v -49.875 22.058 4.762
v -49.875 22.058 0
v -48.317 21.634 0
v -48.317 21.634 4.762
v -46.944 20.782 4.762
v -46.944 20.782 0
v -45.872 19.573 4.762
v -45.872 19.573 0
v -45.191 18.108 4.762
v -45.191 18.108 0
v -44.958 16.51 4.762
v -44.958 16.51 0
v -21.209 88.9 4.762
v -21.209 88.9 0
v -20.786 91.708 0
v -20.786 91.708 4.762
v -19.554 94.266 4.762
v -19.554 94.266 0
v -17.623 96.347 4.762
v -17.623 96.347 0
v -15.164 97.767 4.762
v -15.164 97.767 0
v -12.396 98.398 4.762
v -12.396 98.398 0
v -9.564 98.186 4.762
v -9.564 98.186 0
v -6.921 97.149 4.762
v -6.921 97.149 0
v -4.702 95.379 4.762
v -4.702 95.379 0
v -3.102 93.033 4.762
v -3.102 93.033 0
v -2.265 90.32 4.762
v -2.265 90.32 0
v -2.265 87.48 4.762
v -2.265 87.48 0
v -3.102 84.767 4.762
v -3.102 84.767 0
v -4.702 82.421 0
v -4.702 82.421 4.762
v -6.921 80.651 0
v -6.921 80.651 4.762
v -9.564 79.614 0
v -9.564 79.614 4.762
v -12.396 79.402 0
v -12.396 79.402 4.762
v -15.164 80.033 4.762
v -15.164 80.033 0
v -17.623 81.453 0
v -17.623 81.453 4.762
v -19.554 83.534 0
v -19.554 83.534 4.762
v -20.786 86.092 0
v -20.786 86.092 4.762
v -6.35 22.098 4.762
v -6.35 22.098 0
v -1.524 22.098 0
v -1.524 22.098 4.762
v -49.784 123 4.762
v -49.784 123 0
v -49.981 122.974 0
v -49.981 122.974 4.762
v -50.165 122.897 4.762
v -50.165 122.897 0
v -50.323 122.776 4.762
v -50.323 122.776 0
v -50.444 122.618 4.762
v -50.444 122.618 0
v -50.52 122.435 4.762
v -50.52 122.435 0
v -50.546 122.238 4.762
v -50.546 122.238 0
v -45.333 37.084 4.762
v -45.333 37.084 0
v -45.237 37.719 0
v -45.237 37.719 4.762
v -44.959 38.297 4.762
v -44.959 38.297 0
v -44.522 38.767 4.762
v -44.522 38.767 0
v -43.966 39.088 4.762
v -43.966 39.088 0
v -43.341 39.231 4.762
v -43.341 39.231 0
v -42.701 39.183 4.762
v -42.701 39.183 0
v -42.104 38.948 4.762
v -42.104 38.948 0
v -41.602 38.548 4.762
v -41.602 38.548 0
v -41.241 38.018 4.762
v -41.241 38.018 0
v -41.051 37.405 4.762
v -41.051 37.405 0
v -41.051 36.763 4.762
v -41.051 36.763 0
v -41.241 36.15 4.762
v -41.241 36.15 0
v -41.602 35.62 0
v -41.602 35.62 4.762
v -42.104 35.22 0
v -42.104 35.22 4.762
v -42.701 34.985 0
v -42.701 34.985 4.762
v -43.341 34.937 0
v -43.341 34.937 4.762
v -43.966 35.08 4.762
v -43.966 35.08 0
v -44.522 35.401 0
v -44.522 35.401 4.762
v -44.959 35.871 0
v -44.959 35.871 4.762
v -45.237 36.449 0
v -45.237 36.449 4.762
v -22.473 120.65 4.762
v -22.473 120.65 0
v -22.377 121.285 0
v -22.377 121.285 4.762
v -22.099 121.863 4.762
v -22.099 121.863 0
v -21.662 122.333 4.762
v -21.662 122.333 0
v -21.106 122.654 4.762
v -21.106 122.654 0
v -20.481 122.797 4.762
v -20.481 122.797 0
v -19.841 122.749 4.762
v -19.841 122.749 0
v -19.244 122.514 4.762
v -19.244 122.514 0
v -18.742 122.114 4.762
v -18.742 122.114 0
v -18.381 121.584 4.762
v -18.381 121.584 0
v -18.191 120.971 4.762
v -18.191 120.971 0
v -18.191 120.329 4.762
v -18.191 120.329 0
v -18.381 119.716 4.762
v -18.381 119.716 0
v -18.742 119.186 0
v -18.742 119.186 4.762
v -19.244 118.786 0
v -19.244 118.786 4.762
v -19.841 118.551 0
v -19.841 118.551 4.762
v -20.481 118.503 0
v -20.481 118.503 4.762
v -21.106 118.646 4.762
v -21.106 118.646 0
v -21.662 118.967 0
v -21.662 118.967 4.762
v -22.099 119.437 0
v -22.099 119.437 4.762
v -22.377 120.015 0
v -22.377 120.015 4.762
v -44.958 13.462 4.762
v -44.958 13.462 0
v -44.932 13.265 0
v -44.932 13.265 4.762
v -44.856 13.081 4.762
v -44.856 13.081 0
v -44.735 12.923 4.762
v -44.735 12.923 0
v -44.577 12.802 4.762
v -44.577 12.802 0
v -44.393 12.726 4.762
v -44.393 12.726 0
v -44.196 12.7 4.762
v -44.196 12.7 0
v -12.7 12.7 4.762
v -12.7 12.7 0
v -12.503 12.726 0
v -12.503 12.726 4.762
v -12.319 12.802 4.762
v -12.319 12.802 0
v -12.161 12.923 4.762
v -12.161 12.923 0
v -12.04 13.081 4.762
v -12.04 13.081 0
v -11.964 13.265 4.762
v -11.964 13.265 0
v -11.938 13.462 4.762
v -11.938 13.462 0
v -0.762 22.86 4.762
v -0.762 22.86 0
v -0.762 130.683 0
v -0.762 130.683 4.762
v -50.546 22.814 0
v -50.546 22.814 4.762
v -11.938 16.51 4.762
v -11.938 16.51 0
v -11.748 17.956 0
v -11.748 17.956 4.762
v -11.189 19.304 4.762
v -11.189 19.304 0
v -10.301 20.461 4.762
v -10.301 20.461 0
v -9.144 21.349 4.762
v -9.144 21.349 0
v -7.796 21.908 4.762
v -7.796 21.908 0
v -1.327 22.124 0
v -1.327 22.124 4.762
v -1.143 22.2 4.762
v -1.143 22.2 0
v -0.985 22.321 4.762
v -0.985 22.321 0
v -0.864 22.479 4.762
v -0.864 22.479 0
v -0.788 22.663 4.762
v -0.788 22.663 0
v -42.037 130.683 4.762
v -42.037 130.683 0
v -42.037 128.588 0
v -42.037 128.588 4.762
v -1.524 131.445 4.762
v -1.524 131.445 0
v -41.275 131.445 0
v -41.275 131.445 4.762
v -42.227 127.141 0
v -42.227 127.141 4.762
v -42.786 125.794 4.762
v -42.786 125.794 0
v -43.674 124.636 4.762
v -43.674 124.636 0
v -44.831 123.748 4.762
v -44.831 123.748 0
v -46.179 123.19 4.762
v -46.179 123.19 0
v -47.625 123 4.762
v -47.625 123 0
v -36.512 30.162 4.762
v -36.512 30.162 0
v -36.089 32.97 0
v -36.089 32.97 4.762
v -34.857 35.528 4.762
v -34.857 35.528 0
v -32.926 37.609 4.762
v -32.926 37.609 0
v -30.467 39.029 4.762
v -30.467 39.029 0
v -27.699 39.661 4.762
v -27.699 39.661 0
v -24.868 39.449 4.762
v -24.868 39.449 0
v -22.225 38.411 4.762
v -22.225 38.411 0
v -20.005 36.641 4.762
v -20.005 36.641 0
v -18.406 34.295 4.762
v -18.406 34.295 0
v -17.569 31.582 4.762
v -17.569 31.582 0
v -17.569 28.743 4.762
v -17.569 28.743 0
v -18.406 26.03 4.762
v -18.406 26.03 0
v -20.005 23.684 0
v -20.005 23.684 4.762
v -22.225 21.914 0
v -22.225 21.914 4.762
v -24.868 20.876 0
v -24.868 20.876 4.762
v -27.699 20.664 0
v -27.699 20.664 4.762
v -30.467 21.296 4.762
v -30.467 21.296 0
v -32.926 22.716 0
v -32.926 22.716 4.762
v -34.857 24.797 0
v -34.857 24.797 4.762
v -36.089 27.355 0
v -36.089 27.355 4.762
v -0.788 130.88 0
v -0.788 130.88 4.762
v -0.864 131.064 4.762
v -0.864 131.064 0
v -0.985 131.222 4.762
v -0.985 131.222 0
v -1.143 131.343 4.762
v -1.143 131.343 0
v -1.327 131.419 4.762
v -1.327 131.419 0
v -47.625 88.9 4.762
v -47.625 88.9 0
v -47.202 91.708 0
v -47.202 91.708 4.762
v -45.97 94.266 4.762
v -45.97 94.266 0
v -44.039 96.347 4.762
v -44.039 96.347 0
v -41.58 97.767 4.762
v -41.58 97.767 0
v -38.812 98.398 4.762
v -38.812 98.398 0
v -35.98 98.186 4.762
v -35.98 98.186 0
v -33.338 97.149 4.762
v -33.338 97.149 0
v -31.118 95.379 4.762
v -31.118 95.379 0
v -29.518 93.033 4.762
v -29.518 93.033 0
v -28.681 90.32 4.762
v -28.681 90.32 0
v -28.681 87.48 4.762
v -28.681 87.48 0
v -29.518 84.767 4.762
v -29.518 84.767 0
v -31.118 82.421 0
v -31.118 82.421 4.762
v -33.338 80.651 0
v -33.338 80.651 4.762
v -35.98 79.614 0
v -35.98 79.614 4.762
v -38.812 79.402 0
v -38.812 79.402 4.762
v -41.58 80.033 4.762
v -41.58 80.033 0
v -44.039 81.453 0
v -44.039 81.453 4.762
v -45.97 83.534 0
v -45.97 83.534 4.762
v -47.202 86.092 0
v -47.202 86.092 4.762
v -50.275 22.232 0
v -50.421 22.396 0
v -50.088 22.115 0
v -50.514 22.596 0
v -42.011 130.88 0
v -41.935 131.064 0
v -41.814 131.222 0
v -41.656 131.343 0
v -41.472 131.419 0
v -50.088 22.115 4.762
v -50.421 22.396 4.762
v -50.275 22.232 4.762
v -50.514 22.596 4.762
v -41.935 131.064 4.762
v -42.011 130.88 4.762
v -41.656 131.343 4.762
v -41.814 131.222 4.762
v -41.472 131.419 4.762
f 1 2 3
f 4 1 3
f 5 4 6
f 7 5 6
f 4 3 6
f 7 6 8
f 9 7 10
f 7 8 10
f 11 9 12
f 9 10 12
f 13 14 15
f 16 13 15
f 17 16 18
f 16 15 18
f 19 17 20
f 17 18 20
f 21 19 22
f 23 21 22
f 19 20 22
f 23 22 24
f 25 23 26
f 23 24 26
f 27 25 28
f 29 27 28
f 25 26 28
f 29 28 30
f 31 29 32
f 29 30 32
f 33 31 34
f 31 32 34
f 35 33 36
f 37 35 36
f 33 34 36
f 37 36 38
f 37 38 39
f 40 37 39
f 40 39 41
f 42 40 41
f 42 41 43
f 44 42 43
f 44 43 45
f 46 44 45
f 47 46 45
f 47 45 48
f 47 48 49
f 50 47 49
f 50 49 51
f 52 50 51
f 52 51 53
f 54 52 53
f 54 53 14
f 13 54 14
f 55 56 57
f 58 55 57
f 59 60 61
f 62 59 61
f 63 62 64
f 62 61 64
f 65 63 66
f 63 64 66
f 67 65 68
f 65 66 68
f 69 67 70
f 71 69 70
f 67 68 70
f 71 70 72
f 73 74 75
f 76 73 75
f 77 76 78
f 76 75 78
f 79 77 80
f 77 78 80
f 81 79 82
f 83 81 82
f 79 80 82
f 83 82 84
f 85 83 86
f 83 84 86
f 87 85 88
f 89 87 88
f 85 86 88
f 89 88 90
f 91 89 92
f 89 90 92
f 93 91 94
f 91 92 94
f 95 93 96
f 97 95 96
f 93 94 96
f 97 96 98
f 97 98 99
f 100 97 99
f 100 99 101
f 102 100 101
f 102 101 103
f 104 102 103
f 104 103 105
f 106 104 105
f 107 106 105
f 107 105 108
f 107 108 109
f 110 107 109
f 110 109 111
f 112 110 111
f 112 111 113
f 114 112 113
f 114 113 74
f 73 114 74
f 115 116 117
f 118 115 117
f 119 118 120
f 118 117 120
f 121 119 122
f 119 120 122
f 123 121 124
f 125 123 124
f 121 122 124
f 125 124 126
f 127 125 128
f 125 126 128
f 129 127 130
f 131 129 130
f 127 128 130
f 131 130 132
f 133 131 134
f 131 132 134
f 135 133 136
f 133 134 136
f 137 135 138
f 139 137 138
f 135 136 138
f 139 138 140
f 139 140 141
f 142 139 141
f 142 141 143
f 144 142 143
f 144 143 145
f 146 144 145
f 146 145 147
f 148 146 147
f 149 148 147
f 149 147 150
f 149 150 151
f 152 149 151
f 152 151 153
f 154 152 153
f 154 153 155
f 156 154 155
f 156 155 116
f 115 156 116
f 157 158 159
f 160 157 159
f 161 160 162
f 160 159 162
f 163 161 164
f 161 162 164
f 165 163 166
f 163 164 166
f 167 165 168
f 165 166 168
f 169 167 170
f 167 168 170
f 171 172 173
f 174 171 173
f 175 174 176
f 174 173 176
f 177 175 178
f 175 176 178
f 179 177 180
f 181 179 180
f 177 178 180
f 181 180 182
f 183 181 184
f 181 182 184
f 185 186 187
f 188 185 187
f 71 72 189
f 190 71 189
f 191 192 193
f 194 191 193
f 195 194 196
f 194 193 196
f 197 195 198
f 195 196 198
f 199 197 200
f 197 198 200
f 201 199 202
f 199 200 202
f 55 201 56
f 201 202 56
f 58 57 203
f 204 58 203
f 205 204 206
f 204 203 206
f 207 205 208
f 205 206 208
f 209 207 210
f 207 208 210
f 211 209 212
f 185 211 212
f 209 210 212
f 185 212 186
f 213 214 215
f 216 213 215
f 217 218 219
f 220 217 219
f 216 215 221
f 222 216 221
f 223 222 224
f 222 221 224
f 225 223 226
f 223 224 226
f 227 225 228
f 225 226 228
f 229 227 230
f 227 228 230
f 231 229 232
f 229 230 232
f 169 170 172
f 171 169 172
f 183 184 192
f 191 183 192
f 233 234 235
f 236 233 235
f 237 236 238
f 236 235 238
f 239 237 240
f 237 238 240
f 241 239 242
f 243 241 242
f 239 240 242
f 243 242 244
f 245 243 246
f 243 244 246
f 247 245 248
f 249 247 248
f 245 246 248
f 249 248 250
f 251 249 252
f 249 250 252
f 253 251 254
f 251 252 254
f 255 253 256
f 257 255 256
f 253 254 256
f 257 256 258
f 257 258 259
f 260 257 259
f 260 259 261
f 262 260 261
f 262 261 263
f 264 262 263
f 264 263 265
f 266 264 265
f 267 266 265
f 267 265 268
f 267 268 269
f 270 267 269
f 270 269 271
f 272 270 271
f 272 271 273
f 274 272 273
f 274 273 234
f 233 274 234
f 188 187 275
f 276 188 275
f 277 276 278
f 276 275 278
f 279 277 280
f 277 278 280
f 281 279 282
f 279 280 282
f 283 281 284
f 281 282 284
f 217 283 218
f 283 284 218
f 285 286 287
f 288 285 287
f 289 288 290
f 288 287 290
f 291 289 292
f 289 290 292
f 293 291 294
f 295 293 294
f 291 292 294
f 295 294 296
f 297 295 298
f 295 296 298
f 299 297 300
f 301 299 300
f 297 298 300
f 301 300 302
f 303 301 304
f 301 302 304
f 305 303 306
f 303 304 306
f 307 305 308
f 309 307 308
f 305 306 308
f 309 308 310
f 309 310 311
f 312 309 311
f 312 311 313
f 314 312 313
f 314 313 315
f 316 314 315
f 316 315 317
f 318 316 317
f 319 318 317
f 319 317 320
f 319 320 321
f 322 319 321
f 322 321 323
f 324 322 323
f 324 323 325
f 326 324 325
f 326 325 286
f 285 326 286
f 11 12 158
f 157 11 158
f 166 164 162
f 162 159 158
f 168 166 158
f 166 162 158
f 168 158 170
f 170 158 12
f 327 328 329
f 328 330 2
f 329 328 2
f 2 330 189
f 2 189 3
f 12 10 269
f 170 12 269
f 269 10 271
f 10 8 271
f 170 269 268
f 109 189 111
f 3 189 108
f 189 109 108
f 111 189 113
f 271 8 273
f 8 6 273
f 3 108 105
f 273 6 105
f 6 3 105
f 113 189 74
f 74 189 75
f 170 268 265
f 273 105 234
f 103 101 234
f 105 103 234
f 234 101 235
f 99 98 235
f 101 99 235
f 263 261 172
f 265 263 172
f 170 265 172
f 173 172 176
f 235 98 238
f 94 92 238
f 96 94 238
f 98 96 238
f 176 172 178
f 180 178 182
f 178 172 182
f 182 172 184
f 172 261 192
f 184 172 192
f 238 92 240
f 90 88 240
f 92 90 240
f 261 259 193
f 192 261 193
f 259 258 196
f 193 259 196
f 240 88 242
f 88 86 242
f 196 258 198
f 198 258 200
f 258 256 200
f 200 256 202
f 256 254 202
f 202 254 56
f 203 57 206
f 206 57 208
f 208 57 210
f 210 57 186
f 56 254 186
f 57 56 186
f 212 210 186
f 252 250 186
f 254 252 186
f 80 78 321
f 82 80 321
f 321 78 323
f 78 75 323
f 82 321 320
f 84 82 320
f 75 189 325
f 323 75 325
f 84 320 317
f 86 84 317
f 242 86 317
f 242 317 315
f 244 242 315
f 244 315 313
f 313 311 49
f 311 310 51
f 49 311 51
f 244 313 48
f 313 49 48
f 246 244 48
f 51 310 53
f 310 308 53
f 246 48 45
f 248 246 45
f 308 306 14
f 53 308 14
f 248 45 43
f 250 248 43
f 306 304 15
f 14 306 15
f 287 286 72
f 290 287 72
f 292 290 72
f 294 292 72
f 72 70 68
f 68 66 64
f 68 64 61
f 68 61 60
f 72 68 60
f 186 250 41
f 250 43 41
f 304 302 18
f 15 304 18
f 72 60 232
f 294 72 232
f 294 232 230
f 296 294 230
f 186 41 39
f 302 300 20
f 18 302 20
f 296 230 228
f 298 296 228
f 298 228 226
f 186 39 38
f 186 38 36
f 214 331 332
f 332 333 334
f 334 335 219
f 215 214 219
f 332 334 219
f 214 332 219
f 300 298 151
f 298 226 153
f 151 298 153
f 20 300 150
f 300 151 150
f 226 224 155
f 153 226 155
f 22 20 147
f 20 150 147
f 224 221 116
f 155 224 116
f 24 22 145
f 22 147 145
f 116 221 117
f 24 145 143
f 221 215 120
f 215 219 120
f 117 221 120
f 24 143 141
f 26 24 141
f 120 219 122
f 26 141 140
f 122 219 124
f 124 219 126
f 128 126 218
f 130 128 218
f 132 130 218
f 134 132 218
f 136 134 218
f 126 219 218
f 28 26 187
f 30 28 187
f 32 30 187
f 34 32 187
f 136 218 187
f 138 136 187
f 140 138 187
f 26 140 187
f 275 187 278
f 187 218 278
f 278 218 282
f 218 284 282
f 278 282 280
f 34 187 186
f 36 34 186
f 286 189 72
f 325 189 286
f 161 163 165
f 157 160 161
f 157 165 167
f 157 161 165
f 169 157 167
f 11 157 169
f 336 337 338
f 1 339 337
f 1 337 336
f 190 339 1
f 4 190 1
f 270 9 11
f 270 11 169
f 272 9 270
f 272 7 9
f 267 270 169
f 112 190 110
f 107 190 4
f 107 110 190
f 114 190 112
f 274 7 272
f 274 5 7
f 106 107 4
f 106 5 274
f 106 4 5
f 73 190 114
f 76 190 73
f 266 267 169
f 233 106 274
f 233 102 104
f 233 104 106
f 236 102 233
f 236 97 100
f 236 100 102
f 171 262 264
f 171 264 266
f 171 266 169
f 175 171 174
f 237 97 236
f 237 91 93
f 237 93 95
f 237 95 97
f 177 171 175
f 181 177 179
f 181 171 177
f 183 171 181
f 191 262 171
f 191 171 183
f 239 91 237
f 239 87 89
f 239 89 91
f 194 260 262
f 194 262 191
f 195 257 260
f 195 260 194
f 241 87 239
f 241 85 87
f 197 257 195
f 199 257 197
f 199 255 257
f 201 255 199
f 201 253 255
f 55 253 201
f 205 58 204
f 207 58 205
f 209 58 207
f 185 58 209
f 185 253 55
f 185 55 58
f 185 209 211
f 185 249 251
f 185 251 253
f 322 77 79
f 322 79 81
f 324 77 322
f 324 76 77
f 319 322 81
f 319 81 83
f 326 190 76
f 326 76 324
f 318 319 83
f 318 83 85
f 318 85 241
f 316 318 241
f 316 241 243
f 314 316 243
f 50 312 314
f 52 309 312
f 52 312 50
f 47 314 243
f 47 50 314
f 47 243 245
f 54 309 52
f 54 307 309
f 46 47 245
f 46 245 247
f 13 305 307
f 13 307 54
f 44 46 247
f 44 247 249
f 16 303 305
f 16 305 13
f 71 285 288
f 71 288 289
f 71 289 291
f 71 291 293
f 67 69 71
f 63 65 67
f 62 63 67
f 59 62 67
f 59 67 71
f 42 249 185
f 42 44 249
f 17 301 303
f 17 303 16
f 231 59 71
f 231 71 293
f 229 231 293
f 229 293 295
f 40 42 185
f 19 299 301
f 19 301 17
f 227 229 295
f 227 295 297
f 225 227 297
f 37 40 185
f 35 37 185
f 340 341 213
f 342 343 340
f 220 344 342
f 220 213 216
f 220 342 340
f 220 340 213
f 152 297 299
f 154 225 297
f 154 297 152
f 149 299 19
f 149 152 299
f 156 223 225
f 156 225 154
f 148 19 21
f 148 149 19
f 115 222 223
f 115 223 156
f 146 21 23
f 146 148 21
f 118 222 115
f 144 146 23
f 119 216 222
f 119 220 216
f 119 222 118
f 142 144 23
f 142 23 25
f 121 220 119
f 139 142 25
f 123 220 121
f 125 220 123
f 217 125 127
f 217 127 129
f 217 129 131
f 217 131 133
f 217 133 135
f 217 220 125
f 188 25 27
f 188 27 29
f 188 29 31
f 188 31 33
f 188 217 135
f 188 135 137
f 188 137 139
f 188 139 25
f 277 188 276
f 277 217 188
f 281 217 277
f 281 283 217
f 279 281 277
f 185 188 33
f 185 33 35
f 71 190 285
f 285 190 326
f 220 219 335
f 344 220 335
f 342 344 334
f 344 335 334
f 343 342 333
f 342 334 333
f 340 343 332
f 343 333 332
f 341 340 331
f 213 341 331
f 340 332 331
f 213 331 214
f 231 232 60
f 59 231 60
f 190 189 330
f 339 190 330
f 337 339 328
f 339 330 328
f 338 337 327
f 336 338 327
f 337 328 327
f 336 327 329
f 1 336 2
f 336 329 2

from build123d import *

# Parameters (mm, degrees)
BOSS_EXTRUDE1_DEPTH         = 4.7625
F_3_4_0_75_DIAMETER_HOLE1_D = 19.05
F_6_CLEARANCE_HOLE1_D       = 4.3053


with BuildPart() as part:
    # Sketch1 → Boss-Extrude1 (new body)
    with BuildSketch(Plane.XY):
        with BuildLine():
            Line((-0.762, 22.86), (-0.762, 130.683))
            ThreePointArc((-0.762, 130.683), (-0.985184633, 131.221815367), (-1.524, 131.445))
            Line((-1.524, 131.445), (-41.275, 131.445))
            ThreePointArc((-41.275, 131.445), (-41.813815367, 131.221815367), (-42.037, 130.683))
            Line((-42.037, 130.683), (-42.037, 128.5875))
            ThreePointArc((-42.037, 128.5875), (-43.673687307, 124.636187307), (-47.625, 122.9995))
            Line((-47.625, 122.9995), (-49.784, 122.9995))
            ThreePointArc((-49.784, 122.9995), (-50.322815367, 122.776315367), (-50.546, 122.2375))
            Line((-50.546, 122.2375), (-50.546, 22.814114212))
            ThreePointArc((-50.546, 22.814114212), (-50.354228586, 22.308660594), (-49.87544, 22.057620507))
            ThreePointArc((-49.87544, 22.057620507), (-46.364323705, 20.216659866), (-44.958, 16.51))
            Line((-44.958, 16.51), (-44.958, 13.462))
            ThreePointArc((-44.958, 13.462), (-44.734815367, 12.923184633), (-44.196, 12.7))
            Line((-44.196, 12.7), (-12.7, 12.7))
            ThreePointArc((-12.7, 12.7), (-12.161184633, 12.923184633), (-11.938, 13.462))
            Line((-11.938, 13.462), (-11.938, 16.51))
            ThreePointArc((-11.938, 16.51), (-10.301312693, 20.461312693), (-6.35, 22.098))
            Line((-6.35, 22.098), (-1.524, 22.098))
            ThreePointArc((-1.524, 22.098), (-0.985184633, 22.321184633), (-0.762, 22.86))
        make_face()
    extrude(amount=BOSS_EXTRUDE1_DEPTH)

    # 3/4 (0.75) Diameter Hole1 (through all)
    with Locations(Plane.XY.offset(4.7625)):
        with Locations((-38.1, 88.9), (-11.684, 88.9), (-26.9875, 30.1625)):
            Hole(F_3_4_0_75_DIAMETER_HOLE1_D / 2)

    # #6 Clearance Hole1 (through all)
    with Locations(Plane.XY.offset(4.7625)):
        with Locations((-20.32, 120.65), (-43.18, 37.084)):
            Hole(F_6_CLEARANCE_HOLE1_D / 2)


solid = part.part
